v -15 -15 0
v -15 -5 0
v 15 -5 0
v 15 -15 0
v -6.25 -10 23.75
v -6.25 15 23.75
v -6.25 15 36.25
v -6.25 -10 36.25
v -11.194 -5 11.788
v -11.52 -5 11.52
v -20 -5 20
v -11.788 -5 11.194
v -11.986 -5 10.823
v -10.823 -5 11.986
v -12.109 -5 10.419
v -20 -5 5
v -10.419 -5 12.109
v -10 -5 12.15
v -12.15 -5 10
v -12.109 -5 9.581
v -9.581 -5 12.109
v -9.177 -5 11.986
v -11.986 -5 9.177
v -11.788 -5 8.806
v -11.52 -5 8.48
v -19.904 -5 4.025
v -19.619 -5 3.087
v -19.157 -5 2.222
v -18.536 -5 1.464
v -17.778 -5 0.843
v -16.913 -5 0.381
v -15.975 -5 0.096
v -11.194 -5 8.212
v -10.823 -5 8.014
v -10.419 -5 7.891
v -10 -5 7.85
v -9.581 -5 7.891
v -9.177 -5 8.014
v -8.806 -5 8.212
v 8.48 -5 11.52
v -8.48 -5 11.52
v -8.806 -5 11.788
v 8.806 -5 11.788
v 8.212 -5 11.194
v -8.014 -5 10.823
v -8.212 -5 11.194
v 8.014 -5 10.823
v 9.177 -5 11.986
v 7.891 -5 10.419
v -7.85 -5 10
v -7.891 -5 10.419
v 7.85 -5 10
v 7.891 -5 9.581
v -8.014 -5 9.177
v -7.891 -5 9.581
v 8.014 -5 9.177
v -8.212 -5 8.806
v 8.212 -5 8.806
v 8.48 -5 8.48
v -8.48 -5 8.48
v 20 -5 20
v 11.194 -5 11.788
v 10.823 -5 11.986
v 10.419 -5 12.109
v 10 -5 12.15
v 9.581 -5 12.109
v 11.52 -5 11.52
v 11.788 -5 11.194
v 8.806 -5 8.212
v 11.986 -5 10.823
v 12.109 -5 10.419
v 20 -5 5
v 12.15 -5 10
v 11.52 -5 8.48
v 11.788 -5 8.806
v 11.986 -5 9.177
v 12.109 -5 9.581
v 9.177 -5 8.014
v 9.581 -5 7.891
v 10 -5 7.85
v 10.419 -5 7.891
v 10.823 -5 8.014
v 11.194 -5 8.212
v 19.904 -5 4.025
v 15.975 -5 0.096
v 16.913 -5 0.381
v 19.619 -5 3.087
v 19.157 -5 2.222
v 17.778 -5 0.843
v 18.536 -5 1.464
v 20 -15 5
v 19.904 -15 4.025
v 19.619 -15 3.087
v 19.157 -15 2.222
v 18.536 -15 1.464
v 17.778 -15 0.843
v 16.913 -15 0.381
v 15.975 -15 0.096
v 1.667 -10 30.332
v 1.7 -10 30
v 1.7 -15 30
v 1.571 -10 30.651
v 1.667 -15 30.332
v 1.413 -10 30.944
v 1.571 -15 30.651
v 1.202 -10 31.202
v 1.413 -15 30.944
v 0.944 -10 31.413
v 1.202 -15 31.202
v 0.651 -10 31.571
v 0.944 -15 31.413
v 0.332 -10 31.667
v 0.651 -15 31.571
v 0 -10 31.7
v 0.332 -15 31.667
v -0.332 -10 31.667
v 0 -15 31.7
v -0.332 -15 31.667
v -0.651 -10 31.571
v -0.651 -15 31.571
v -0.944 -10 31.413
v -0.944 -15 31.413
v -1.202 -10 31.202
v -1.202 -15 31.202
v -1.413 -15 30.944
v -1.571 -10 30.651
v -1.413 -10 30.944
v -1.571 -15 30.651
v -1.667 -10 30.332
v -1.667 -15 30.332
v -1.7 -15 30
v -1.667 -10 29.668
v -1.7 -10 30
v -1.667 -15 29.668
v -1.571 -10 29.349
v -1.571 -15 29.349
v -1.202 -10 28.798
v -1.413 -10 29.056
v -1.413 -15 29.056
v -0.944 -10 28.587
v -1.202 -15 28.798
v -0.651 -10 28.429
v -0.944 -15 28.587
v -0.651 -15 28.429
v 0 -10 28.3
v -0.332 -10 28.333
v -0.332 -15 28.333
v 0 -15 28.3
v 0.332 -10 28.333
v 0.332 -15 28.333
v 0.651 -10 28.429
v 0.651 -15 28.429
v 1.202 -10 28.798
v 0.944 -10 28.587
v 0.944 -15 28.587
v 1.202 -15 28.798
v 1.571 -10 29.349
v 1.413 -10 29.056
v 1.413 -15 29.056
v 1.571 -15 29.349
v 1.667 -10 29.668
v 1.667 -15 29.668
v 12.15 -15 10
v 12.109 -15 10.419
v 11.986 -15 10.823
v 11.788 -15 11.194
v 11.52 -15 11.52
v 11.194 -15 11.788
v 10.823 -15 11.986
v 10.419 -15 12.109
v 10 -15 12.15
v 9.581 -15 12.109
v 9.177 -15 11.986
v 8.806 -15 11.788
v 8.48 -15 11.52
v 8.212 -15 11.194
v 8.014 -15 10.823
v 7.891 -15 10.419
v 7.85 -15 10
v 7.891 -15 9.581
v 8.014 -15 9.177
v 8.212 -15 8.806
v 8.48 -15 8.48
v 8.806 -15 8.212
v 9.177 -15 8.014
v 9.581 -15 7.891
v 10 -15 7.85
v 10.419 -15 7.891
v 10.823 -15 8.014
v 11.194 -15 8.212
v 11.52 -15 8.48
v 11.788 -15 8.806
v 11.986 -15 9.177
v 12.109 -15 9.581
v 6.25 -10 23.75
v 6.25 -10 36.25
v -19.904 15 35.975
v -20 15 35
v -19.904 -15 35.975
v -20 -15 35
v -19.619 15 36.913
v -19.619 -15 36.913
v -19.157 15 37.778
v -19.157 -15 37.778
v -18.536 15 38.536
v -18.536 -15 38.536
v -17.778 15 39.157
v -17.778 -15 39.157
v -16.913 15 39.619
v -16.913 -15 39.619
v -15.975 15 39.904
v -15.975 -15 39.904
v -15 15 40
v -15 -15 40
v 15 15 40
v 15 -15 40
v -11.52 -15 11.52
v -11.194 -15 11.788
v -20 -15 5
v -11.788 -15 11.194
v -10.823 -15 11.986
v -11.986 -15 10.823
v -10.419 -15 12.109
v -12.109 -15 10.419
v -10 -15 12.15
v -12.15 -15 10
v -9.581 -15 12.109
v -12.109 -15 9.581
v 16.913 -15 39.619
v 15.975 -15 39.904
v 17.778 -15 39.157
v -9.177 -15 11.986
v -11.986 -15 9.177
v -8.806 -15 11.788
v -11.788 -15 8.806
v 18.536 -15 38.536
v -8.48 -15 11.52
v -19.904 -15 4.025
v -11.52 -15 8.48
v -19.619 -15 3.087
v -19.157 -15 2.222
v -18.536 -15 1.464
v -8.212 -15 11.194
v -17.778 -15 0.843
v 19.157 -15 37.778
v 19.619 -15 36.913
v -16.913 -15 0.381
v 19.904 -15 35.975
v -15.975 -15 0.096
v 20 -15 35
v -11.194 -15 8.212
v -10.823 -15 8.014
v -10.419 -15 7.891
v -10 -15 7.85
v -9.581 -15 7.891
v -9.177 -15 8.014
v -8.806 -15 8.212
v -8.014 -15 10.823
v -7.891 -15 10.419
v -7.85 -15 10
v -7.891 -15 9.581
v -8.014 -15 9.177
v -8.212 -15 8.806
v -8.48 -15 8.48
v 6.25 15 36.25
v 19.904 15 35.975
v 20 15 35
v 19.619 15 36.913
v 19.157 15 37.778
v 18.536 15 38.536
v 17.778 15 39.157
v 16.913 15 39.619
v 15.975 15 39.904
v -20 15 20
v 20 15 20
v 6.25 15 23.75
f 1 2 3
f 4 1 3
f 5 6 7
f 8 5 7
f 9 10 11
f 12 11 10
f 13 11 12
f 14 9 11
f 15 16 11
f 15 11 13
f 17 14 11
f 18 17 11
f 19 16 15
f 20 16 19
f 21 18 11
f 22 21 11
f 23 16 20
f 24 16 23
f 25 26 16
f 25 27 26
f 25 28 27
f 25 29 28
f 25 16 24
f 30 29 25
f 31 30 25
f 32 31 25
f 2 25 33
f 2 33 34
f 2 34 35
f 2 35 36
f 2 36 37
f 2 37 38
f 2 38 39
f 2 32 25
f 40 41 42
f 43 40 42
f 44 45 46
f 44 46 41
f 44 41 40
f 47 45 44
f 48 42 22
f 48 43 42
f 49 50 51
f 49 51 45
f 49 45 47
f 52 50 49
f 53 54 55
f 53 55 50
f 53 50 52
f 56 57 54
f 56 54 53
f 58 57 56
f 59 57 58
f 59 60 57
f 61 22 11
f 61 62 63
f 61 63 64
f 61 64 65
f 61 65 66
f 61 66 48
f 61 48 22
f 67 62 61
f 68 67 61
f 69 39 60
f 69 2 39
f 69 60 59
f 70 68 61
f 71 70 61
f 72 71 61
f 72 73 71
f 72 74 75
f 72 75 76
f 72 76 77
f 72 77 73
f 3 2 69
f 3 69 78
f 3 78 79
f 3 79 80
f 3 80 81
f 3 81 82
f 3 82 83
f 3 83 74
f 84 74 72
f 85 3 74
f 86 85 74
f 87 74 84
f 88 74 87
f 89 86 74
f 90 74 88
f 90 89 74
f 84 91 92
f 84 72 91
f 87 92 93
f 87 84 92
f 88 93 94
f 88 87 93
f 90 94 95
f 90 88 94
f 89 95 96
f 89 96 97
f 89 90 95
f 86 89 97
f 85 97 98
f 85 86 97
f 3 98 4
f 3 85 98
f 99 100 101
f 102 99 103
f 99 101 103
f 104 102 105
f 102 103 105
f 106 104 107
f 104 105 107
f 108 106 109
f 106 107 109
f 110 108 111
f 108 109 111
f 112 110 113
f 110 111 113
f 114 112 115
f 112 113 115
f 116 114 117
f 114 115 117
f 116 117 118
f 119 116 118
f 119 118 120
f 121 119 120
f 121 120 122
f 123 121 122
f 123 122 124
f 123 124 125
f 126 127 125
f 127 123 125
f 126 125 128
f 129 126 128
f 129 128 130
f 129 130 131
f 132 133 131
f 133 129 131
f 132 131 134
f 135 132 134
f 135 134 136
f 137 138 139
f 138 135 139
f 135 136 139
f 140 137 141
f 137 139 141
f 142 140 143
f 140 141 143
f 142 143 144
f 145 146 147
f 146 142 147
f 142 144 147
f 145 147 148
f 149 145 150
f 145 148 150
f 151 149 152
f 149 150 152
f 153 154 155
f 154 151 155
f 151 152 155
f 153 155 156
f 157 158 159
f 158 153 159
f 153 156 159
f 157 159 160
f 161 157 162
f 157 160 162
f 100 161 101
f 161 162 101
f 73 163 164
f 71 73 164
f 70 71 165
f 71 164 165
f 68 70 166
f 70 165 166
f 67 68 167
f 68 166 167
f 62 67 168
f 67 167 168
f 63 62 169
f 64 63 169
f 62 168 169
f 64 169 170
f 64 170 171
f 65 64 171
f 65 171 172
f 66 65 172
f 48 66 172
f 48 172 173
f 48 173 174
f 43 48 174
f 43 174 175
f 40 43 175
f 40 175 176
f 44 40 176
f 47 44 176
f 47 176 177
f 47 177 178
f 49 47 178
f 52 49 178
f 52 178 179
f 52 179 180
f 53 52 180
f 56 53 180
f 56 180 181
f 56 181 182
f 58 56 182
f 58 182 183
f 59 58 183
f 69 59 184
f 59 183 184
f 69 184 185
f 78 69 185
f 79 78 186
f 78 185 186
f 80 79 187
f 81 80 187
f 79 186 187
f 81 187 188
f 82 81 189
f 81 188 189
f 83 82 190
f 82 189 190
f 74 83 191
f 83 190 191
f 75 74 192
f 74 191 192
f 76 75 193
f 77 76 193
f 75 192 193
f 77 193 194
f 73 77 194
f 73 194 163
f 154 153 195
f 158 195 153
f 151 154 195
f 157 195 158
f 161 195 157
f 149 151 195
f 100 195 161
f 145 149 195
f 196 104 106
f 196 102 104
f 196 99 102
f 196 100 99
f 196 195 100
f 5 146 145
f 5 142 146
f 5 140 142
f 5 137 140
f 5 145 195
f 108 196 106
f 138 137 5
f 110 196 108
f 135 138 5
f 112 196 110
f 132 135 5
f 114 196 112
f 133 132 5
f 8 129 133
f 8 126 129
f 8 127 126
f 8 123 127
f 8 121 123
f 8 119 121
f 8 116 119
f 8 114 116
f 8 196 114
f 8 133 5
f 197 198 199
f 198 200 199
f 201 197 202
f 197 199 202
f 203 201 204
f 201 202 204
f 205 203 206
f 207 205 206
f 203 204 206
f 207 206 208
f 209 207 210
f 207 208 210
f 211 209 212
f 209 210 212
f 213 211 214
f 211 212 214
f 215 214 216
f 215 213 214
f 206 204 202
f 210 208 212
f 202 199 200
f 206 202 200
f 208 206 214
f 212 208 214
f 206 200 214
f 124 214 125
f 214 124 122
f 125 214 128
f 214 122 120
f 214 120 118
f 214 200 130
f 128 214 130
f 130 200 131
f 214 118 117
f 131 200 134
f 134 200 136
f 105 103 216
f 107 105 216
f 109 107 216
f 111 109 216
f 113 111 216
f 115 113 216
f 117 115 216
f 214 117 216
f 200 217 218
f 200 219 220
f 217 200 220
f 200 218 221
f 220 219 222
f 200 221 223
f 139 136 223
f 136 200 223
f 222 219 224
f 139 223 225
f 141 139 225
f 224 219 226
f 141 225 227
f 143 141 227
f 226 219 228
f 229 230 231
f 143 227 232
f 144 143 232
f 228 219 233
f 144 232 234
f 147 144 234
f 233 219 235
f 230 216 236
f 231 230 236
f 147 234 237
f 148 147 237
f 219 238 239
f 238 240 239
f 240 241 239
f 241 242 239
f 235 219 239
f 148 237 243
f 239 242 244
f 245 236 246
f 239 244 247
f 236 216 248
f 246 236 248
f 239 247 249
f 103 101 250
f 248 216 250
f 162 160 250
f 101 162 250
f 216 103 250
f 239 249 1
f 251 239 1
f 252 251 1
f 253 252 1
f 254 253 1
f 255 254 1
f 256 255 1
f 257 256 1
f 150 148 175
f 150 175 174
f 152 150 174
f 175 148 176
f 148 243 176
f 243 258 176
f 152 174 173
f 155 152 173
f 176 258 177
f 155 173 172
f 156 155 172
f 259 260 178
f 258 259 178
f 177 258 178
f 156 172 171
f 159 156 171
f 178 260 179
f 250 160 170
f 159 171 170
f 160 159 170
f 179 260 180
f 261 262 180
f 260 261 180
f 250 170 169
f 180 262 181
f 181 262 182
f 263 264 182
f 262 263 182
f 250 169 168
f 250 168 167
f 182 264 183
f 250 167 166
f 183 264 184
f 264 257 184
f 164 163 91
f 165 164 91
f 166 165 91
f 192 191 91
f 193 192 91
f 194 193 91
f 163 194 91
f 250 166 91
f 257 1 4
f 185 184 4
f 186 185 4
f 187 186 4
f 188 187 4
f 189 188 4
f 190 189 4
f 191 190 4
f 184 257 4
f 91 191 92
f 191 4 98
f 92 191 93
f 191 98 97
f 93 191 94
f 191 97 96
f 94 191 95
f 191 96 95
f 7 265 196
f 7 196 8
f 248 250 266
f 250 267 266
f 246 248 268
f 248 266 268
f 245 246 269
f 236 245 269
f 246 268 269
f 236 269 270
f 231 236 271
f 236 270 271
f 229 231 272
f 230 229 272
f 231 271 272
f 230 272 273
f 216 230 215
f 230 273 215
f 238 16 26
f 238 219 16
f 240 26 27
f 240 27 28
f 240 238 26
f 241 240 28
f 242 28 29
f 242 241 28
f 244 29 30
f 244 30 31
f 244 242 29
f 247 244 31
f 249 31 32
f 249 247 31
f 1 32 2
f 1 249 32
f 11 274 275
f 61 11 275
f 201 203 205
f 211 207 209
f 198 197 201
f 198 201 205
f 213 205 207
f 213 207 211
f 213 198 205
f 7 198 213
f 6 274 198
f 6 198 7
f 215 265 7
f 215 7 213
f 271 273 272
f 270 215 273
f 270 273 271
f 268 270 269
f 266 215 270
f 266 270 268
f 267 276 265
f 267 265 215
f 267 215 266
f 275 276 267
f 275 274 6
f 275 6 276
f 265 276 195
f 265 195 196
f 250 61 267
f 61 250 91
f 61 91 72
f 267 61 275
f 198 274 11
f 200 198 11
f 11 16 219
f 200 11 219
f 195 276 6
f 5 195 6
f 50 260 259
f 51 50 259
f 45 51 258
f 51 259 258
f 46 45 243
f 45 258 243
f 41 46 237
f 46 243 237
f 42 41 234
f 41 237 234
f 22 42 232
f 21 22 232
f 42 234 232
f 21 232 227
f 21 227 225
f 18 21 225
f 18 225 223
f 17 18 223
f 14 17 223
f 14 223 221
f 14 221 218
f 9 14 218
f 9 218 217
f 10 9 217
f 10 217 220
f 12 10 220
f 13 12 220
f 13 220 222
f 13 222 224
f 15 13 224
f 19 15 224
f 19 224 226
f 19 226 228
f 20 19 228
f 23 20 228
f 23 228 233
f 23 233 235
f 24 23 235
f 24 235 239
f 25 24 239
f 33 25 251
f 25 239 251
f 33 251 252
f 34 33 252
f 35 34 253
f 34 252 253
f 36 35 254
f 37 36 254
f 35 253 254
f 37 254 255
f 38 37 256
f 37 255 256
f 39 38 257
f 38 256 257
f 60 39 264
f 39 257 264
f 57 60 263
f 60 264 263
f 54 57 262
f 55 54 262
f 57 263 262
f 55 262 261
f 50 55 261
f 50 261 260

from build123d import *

# Parameters (mm, degrees)
F0_W     = 40
F0_H     = 20
F0_H_2   = 10
F1_DEPTH = 40
F2_DEPTH = 20
F3_R     = 2.15
F3_R_2   = 1.7
F4_DEPTH = 40
F5_W     = 12.5
F5_H     = 12.5
F5_R     = 1.7
F6_DEPTH = 25
F7_R     = 5


with BuildPart() as f1:
    # F0 (on Top) → F1 (new body)
    with BuildSketch(Plane.XY):
        with Locations((0, 5)):
            Rectangle(F0_W, F0_H)
        with Locations((0, -10)):
            Rectangle(F0_W, F0_H_2)
    extrude(amount=F1_DEPTH)

    # F0 (on Top) → F2 (cut)
    with BuildSketch(Plane.XY):
        with Locations((0, 5)):
            Rectangle(F0_W, F0_H)
    extrude(amount=F2_DEPTH, mode=Mode.SUBTRACT)

    # F3 (on face) → F4 (cut)
    with BuildSketch(Plane.XZ.offset(15)):
        with Locations((-10, 10)):
            Circle(F3_R)
        with Locations((10, 10)):
            Circle(F3_R)
        with Locations((0, 30)):
            Circle(F3_R_2)
    extrude(amount=-F4_DEPTH, mode=Mode.SUBTRACT)

    # F5 (on face) → F6 (cut)
    with BuildSketch(Plane(origin=(0, 15, 0), x_dir=(-1, 0, 0), z_dir=(0, 1, 0))):
        with Locations((0, 30)):
            Rectangle(F5_W, F5_H)
        with Locations((0, 30)):
            Circle(F5_R, mode=Mode.SUBTRACT)
    extrude(amount=-F6_DEPTH, mode=Mode.SUBTRACT)

    # F7
    f7_edges = [f1.edges().sort_by_distance(p)[0] for p in [
        (-20, -10, 0),
        (20, -10, 0),
        (-20, 0, 40),
        (20, 0, 40),
    ]]
    fillet(f7_edges, radius=F7_R)


solid = f1.part
